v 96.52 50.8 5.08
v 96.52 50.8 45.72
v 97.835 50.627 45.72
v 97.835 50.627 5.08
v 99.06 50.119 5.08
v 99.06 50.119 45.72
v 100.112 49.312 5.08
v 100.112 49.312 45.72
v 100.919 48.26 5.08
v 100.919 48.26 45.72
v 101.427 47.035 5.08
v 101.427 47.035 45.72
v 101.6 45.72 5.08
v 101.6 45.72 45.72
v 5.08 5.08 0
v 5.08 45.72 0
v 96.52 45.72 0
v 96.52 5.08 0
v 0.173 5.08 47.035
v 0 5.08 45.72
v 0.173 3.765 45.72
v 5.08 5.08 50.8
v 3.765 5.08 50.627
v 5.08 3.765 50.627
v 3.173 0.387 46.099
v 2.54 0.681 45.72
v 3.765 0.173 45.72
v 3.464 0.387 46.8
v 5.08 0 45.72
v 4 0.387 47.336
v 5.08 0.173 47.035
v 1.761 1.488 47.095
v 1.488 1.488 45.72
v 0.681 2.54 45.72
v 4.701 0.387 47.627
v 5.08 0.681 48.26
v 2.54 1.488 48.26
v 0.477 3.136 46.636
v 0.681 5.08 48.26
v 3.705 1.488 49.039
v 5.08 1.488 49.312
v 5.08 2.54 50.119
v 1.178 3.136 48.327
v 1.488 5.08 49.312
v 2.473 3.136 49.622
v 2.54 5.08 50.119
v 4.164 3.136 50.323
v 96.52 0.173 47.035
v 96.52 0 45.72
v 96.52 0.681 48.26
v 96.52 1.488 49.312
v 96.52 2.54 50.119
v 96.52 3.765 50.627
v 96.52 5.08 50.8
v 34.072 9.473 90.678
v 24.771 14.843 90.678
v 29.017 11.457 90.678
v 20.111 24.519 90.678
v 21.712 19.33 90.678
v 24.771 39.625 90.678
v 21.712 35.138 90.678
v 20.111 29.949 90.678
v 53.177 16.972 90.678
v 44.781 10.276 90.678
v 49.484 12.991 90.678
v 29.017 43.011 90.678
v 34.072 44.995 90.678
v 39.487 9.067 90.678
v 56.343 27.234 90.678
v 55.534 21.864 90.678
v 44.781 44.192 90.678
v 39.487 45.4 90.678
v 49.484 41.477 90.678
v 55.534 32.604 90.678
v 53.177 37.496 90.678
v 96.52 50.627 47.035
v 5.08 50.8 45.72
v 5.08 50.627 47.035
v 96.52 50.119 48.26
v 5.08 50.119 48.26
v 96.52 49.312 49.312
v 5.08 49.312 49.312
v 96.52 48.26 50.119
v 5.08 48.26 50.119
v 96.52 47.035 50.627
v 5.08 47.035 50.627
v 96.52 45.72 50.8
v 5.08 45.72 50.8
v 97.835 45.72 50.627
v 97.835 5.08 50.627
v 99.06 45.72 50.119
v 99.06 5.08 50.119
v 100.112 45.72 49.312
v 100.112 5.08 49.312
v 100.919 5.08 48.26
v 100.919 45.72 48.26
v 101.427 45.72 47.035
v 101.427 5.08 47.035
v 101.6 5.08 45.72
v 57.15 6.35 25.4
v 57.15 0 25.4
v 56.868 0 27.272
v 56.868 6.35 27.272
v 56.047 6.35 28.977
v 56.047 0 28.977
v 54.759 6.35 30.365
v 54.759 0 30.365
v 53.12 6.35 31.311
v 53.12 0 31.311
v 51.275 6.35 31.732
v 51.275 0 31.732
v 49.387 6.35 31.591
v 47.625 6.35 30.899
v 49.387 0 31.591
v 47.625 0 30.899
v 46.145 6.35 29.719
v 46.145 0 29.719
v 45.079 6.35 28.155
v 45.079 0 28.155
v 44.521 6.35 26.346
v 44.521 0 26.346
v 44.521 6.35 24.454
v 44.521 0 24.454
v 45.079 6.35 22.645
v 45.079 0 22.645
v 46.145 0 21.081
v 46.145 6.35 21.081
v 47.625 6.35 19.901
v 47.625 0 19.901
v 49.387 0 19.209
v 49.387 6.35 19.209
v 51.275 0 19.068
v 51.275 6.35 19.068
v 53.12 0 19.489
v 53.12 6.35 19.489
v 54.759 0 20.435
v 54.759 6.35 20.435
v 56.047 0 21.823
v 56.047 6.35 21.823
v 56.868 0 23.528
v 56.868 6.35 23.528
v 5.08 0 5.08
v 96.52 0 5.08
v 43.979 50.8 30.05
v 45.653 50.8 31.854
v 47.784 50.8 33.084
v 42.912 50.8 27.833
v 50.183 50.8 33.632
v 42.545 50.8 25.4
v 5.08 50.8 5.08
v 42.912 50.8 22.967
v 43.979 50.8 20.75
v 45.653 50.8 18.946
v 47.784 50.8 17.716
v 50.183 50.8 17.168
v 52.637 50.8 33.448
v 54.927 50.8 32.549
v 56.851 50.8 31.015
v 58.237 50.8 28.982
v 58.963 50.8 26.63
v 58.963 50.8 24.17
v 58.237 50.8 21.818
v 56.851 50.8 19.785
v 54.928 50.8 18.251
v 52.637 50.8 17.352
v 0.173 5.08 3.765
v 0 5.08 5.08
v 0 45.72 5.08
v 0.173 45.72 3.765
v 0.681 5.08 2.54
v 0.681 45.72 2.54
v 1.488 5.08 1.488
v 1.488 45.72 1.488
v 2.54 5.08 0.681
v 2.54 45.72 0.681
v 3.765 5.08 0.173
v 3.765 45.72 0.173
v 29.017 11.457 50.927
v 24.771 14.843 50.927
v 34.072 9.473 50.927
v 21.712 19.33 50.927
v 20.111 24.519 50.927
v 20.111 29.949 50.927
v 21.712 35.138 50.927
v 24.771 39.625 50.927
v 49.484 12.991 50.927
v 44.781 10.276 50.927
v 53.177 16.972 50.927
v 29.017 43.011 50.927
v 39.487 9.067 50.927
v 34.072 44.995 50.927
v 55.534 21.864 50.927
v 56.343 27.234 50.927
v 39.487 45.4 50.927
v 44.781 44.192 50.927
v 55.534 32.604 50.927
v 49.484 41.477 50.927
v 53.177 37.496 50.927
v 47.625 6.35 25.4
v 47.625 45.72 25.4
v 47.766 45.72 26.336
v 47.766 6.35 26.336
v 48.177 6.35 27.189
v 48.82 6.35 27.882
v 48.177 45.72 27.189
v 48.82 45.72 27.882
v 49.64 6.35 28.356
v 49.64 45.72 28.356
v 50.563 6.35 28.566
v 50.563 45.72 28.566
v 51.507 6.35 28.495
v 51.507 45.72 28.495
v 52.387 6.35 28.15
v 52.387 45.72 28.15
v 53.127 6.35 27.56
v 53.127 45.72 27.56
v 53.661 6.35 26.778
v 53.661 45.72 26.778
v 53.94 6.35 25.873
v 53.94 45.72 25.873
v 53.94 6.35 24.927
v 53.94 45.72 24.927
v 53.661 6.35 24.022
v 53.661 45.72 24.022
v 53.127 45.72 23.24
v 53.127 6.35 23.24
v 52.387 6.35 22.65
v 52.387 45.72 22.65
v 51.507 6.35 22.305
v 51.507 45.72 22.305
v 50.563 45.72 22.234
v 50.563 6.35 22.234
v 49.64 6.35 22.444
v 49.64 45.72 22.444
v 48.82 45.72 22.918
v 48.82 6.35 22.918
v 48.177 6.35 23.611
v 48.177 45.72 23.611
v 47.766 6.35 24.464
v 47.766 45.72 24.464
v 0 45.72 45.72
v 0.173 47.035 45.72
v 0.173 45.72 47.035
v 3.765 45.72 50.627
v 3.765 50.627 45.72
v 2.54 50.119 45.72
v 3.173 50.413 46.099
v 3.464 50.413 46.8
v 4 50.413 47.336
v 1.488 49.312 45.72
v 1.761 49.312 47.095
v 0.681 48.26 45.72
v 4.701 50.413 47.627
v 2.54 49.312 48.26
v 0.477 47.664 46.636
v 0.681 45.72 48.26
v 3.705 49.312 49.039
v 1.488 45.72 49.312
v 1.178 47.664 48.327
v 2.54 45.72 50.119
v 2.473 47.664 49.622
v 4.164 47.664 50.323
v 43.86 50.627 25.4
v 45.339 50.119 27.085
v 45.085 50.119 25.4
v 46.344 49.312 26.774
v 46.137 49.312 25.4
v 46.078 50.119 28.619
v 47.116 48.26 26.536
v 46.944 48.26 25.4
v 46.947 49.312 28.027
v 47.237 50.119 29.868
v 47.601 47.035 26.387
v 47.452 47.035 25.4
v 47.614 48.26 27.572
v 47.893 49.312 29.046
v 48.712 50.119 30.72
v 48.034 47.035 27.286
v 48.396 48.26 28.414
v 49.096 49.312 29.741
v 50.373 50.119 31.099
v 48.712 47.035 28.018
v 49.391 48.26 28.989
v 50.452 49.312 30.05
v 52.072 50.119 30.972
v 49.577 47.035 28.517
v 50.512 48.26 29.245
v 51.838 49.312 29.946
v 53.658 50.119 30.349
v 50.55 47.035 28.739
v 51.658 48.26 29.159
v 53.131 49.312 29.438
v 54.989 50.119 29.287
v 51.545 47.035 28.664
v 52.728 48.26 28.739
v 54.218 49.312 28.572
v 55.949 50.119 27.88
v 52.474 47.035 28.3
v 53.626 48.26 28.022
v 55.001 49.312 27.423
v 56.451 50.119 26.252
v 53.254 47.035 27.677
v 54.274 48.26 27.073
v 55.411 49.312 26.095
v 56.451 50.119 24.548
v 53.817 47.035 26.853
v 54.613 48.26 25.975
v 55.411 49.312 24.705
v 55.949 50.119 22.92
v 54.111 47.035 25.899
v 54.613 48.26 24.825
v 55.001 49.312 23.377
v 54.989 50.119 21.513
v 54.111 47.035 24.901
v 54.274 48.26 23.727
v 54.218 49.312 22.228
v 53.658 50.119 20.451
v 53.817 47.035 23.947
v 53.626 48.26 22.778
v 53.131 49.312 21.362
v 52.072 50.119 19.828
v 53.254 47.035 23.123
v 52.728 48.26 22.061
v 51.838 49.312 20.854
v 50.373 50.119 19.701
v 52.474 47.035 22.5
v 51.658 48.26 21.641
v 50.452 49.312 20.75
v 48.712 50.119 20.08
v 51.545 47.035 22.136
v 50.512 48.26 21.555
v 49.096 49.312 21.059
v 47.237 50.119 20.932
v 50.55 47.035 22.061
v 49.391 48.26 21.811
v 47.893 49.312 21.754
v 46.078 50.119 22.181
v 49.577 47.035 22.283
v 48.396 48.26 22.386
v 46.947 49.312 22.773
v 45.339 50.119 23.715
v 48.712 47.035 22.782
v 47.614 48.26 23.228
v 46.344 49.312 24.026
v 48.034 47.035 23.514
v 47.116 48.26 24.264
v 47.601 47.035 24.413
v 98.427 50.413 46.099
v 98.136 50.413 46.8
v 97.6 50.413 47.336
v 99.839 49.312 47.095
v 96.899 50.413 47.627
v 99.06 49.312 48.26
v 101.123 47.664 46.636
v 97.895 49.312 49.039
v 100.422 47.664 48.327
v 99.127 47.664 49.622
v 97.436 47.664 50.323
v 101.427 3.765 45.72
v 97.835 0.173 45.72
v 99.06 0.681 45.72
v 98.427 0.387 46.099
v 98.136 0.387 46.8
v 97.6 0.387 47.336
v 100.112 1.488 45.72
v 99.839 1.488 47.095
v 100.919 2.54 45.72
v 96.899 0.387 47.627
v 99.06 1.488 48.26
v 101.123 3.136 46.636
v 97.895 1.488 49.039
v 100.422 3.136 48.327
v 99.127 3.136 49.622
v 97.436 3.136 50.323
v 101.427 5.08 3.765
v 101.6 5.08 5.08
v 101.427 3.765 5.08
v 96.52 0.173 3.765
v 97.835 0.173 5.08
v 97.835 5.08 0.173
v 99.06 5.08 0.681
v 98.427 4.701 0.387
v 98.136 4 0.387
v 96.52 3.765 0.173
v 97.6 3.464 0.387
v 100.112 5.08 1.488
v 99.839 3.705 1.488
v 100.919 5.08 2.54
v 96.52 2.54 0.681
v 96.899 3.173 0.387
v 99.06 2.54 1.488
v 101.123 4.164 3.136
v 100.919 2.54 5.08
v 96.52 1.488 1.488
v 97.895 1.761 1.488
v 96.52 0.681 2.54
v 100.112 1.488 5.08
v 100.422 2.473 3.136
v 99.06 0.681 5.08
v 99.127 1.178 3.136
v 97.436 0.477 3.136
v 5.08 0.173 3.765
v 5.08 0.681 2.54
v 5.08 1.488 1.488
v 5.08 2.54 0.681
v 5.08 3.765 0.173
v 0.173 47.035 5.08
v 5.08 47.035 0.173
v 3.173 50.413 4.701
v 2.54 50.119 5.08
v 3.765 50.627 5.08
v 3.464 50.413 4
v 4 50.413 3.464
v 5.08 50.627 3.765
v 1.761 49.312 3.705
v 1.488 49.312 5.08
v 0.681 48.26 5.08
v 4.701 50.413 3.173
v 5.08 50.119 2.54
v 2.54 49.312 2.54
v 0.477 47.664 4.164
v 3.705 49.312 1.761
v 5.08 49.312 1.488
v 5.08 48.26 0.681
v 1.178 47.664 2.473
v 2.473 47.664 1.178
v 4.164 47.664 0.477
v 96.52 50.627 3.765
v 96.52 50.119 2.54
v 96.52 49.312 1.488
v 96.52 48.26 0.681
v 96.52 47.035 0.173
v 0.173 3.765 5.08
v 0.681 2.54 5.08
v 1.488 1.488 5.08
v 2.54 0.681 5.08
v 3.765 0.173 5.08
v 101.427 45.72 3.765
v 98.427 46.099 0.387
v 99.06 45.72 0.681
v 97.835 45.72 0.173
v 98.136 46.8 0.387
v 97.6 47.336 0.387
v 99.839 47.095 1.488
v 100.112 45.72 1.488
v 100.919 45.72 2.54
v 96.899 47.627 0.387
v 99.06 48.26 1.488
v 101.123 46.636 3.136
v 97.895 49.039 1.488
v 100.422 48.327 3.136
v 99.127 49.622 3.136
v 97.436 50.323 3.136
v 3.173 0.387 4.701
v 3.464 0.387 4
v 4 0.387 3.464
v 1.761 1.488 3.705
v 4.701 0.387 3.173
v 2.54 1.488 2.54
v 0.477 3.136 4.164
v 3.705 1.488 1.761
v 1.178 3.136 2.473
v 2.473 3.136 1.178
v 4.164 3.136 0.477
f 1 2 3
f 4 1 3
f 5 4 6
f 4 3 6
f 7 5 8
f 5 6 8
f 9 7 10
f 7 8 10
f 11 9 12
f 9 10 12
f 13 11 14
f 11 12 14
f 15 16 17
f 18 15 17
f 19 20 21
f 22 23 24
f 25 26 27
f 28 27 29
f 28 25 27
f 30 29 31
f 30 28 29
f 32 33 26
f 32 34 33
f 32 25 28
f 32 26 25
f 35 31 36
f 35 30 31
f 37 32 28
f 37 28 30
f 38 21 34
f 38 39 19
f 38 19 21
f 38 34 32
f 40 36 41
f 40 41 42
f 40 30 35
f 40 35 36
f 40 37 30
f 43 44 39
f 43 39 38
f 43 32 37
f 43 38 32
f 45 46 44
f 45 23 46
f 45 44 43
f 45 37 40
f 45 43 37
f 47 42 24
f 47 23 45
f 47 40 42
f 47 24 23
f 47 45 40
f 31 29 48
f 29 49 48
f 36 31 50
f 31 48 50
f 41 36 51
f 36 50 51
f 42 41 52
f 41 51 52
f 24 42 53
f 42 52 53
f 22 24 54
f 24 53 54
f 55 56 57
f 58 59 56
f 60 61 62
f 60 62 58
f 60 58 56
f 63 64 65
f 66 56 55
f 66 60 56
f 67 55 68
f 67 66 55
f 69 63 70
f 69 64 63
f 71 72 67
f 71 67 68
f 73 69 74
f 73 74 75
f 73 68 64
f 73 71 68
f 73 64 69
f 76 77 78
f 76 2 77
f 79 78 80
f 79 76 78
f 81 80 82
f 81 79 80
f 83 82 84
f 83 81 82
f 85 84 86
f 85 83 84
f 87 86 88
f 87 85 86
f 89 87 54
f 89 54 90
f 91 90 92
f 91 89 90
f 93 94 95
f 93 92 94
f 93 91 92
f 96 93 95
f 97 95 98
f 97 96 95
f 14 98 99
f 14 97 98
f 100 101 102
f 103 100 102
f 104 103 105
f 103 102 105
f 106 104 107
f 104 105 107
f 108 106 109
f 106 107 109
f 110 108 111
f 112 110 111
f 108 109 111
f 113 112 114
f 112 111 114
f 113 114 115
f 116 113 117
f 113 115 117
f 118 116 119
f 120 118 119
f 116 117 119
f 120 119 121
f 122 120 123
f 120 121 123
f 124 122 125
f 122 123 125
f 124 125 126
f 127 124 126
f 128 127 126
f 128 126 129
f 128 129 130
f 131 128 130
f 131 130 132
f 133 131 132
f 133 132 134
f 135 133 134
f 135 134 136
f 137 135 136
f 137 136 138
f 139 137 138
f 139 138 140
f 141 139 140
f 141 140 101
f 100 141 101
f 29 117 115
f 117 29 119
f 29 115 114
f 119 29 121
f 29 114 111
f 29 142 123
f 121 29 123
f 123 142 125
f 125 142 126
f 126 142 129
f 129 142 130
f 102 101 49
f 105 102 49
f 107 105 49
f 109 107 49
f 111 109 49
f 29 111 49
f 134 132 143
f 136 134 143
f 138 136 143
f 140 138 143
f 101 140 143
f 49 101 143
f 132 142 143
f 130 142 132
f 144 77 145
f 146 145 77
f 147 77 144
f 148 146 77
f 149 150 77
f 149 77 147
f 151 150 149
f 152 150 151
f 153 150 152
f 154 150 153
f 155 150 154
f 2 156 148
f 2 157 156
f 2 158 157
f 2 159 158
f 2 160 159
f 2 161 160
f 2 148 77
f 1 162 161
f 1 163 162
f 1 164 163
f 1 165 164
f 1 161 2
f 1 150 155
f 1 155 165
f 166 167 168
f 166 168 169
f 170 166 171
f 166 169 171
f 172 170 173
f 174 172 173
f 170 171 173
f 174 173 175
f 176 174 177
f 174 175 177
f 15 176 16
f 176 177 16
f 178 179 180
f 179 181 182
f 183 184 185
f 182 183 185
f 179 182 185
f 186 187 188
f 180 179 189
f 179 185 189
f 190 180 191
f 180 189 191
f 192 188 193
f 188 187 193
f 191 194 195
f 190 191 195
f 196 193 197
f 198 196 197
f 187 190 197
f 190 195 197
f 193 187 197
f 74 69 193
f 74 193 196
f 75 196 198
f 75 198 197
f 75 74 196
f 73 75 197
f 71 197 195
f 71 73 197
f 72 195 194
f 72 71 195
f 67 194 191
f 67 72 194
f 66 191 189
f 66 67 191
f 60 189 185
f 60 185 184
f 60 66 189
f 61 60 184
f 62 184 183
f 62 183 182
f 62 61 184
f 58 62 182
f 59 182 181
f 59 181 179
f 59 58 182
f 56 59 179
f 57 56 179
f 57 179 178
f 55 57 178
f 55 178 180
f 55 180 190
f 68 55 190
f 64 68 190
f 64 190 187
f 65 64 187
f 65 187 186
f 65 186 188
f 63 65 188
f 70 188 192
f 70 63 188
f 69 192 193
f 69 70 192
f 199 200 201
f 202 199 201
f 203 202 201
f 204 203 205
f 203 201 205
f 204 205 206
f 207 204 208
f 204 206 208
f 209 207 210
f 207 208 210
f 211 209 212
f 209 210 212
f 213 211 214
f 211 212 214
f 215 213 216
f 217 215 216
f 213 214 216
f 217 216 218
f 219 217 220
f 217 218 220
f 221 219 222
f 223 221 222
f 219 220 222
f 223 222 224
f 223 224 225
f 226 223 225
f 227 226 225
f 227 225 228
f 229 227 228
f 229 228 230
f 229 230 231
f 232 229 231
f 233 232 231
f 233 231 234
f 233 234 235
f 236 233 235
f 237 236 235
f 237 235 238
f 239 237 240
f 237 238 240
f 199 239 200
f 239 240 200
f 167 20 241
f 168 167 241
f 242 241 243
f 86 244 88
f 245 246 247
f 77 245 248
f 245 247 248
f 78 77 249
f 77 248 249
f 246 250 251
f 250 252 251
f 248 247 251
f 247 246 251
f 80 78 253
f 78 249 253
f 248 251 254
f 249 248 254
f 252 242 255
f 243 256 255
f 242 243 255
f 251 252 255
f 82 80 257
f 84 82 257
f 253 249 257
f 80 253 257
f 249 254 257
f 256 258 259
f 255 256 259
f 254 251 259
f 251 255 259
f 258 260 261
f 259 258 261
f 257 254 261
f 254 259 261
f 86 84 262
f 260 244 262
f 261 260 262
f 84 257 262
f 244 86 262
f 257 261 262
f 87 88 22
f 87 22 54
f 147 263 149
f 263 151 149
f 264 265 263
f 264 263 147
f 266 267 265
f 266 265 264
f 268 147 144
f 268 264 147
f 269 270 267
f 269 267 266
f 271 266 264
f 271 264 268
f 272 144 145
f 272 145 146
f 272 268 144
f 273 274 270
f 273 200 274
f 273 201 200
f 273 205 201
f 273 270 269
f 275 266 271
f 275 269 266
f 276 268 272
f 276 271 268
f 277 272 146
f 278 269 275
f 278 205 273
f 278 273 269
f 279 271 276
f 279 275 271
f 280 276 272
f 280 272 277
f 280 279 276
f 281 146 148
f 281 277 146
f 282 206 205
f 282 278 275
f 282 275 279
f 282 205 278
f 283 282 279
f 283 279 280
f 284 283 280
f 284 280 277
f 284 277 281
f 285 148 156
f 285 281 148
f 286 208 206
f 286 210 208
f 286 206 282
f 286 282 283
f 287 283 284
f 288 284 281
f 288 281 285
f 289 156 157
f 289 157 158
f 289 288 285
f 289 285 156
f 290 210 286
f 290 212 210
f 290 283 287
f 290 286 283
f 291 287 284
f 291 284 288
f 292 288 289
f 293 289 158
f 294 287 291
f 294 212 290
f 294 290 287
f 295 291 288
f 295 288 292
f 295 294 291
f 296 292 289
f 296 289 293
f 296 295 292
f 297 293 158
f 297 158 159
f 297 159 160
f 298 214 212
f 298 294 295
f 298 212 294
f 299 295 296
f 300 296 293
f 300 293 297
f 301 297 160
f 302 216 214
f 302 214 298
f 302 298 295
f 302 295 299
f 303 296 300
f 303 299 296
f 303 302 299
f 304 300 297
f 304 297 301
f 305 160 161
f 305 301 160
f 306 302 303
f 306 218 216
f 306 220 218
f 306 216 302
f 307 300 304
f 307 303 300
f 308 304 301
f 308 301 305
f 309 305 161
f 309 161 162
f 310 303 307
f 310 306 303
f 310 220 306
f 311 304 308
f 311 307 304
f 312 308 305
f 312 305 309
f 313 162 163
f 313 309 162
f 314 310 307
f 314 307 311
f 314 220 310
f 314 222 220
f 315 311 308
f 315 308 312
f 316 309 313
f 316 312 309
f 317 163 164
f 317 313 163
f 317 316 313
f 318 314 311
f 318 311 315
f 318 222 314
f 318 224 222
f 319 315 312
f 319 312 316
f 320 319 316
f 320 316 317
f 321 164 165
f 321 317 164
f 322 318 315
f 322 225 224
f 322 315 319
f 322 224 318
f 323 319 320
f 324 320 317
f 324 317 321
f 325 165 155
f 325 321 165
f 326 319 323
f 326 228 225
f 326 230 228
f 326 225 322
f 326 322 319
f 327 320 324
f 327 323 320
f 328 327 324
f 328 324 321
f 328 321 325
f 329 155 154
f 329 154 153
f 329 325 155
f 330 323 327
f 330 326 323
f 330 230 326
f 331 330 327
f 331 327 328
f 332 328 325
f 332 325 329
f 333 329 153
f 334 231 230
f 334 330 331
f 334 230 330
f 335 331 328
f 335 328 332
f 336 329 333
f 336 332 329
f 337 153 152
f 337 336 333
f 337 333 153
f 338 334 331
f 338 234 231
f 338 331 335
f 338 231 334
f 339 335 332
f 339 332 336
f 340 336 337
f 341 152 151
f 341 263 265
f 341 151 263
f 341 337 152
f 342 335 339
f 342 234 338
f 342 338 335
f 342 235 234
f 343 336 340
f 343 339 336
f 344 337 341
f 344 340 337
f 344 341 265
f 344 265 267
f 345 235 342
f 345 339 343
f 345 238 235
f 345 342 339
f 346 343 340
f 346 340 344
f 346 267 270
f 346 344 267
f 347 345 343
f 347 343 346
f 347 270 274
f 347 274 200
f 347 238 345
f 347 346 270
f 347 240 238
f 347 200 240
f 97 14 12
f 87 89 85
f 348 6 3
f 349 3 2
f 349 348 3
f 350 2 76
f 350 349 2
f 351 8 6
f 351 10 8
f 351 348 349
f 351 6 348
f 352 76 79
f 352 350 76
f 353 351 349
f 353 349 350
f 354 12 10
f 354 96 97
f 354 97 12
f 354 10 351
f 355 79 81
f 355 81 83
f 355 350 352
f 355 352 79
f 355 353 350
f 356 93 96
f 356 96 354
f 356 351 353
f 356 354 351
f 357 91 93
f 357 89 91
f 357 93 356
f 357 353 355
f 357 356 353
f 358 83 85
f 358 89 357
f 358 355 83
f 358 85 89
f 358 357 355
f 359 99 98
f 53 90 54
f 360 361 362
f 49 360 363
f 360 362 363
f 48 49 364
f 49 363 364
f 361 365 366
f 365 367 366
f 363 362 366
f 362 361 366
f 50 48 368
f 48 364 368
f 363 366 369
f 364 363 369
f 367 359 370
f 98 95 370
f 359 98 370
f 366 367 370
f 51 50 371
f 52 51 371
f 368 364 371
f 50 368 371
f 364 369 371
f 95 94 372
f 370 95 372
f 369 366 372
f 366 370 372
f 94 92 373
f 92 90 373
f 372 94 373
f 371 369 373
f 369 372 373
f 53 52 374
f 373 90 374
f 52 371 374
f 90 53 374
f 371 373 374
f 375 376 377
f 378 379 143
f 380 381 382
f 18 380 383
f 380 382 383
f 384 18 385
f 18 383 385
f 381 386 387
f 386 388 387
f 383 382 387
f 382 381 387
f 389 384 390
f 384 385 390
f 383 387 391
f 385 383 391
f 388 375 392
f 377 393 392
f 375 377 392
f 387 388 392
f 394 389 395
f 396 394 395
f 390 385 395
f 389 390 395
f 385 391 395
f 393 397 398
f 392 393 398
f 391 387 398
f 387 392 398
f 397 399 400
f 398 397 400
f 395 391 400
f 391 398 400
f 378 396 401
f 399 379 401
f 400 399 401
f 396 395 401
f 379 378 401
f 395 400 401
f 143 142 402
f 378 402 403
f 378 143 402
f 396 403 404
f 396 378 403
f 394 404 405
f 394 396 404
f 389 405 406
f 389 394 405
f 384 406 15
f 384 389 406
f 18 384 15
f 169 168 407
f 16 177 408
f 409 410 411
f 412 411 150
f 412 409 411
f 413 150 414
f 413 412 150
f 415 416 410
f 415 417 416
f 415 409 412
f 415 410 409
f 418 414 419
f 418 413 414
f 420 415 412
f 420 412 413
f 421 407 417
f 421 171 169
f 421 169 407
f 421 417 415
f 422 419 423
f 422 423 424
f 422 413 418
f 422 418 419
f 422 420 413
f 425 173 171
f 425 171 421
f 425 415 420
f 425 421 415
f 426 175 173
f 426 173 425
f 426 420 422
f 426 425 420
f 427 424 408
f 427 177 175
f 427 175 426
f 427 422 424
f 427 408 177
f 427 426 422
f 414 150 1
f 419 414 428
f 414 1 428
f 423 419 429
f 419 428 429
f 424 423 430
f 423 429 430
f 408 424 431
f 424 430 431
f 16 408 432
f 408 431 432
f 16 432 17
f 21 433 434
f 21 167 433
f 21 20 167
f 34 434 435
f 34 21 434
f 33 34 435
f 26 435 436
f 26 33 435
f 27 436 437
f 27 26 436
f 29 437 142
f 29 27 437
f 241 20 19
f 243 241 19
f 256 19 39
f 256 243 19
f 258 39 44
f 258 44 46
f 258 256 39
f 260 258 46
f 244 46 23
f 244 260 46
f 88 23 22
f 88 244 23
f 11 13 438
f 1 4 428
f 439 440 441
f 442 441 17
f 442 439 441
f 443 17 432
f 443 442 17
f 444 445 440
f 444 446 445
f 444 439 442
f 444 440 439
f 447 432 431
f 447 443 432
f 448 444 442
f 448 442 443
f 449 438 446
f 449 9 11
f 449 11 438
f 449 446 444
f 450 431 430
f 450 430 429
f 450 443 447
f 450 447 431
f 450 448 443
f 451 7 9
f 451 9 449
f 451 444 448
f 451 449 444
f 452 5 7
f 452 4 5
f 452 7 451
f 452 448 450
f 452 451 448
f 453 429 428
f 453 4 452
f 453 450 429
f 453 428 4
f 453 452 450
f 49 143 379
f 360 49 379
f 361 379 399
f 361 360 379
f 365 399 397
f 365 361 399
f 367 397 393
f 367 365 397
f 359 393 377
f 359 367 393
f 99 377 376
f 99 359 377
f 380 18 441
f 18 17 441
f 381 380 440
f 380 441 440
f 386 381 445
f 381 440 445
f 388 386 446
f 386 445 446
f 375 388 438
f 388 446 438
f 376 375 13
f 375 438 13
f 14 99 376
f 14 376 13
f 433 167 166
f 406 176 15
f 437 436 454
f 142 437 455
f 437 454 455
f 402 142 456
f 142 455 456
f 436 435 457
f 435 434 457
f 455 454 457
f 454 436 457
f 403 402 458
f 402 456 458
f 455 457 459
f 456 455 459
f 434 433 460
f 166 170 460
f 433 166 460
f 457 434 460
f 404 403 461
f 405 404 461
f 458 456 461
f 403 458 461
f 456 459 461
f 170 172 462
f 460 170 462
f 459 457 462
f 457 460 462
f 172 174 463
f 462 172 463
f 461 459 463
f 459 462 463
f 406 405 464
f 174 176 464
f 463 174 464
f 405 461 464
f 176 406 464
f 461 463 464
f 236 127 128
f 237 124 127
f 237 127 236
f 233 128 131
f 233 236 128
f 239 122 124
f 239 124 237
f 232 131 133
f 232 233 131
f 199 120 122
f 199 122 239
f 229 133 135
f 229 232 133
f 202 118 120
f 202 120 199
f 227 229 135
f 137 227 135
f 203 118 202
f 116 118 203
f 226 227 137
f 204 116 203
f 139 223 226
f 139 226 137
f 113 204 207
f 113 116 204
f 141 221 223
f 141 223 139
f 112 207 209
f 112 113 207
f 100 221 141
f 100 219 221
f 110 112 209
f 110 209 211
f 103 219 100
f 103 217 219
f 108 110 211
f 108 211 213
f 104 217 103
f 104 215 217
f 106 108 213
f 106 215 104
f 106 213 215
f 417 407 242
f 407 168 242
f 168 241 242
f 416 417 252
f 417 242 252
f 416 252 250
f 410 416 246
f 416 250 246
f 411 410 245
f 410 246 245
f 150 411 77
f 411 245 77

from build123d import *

# Parameters (mm, degrees)
F0_W           = 101.6
F0_H           = 50.8
F1_DEPTH       = 50.8
F3_D           = 6.35
F3_CBORE_D     = 12.7
F3_CBORE_DEPTH = 6.35
F4_R           = 5.08
F6_R           = 18.2174752487
F7_DEPTH       = 39.751


with BuildPart() as f1:
    # F0 (on Top) → F1 (new body)
    with BuildSketch(Plane.XY):
        with Locations((50.8, 25.4)):
            Rectangle(F0_W, F0_H)
    extrude(amount=F1_DEPTH)

    # F3 (through all)
    with Locations(Plane.XZ):
        with Locations((50.8, 25.4)):
            CounterBoreHole(F3_D / 2, F3_CBORE_D / 2, F3_CBORE_DEPTH)

    # F4
    f4_edges = [f1.edges().sort_by_distance(p)[0] for p in [
        (101.6, 25.4, 50.8),
        (101.6, 0, 25.4),
        (101.6, 50.8, 25.4),
        (101.6, 25.4, 0),
        (0, 25.4, 50.8),
        (0, 25.4, 0),
        (0, 50.8, 25.4),
        (0, 0, 25.4),
        (50.8, 0, 50.8),
        (50.8, 0, 0),
        (50.8, 50.8, 0),
        (50.8, 50.8, 50.8),
        (47.625, 50.8, 25.4),
    ]]
    fillet(f4_edges, radius=F4_R)


with BuildPart() as f7:
    # F6 (on offset) → F7 (new body)
    with BuildSketch(Plane.XY.offset(90.678)):
        with Locations((38.1254069507, 27.2338427603)):
            Circle(F6_R)
    extrude(amount=-F7_DEPTH)


solid = Compound([f1.part, f7.part])
